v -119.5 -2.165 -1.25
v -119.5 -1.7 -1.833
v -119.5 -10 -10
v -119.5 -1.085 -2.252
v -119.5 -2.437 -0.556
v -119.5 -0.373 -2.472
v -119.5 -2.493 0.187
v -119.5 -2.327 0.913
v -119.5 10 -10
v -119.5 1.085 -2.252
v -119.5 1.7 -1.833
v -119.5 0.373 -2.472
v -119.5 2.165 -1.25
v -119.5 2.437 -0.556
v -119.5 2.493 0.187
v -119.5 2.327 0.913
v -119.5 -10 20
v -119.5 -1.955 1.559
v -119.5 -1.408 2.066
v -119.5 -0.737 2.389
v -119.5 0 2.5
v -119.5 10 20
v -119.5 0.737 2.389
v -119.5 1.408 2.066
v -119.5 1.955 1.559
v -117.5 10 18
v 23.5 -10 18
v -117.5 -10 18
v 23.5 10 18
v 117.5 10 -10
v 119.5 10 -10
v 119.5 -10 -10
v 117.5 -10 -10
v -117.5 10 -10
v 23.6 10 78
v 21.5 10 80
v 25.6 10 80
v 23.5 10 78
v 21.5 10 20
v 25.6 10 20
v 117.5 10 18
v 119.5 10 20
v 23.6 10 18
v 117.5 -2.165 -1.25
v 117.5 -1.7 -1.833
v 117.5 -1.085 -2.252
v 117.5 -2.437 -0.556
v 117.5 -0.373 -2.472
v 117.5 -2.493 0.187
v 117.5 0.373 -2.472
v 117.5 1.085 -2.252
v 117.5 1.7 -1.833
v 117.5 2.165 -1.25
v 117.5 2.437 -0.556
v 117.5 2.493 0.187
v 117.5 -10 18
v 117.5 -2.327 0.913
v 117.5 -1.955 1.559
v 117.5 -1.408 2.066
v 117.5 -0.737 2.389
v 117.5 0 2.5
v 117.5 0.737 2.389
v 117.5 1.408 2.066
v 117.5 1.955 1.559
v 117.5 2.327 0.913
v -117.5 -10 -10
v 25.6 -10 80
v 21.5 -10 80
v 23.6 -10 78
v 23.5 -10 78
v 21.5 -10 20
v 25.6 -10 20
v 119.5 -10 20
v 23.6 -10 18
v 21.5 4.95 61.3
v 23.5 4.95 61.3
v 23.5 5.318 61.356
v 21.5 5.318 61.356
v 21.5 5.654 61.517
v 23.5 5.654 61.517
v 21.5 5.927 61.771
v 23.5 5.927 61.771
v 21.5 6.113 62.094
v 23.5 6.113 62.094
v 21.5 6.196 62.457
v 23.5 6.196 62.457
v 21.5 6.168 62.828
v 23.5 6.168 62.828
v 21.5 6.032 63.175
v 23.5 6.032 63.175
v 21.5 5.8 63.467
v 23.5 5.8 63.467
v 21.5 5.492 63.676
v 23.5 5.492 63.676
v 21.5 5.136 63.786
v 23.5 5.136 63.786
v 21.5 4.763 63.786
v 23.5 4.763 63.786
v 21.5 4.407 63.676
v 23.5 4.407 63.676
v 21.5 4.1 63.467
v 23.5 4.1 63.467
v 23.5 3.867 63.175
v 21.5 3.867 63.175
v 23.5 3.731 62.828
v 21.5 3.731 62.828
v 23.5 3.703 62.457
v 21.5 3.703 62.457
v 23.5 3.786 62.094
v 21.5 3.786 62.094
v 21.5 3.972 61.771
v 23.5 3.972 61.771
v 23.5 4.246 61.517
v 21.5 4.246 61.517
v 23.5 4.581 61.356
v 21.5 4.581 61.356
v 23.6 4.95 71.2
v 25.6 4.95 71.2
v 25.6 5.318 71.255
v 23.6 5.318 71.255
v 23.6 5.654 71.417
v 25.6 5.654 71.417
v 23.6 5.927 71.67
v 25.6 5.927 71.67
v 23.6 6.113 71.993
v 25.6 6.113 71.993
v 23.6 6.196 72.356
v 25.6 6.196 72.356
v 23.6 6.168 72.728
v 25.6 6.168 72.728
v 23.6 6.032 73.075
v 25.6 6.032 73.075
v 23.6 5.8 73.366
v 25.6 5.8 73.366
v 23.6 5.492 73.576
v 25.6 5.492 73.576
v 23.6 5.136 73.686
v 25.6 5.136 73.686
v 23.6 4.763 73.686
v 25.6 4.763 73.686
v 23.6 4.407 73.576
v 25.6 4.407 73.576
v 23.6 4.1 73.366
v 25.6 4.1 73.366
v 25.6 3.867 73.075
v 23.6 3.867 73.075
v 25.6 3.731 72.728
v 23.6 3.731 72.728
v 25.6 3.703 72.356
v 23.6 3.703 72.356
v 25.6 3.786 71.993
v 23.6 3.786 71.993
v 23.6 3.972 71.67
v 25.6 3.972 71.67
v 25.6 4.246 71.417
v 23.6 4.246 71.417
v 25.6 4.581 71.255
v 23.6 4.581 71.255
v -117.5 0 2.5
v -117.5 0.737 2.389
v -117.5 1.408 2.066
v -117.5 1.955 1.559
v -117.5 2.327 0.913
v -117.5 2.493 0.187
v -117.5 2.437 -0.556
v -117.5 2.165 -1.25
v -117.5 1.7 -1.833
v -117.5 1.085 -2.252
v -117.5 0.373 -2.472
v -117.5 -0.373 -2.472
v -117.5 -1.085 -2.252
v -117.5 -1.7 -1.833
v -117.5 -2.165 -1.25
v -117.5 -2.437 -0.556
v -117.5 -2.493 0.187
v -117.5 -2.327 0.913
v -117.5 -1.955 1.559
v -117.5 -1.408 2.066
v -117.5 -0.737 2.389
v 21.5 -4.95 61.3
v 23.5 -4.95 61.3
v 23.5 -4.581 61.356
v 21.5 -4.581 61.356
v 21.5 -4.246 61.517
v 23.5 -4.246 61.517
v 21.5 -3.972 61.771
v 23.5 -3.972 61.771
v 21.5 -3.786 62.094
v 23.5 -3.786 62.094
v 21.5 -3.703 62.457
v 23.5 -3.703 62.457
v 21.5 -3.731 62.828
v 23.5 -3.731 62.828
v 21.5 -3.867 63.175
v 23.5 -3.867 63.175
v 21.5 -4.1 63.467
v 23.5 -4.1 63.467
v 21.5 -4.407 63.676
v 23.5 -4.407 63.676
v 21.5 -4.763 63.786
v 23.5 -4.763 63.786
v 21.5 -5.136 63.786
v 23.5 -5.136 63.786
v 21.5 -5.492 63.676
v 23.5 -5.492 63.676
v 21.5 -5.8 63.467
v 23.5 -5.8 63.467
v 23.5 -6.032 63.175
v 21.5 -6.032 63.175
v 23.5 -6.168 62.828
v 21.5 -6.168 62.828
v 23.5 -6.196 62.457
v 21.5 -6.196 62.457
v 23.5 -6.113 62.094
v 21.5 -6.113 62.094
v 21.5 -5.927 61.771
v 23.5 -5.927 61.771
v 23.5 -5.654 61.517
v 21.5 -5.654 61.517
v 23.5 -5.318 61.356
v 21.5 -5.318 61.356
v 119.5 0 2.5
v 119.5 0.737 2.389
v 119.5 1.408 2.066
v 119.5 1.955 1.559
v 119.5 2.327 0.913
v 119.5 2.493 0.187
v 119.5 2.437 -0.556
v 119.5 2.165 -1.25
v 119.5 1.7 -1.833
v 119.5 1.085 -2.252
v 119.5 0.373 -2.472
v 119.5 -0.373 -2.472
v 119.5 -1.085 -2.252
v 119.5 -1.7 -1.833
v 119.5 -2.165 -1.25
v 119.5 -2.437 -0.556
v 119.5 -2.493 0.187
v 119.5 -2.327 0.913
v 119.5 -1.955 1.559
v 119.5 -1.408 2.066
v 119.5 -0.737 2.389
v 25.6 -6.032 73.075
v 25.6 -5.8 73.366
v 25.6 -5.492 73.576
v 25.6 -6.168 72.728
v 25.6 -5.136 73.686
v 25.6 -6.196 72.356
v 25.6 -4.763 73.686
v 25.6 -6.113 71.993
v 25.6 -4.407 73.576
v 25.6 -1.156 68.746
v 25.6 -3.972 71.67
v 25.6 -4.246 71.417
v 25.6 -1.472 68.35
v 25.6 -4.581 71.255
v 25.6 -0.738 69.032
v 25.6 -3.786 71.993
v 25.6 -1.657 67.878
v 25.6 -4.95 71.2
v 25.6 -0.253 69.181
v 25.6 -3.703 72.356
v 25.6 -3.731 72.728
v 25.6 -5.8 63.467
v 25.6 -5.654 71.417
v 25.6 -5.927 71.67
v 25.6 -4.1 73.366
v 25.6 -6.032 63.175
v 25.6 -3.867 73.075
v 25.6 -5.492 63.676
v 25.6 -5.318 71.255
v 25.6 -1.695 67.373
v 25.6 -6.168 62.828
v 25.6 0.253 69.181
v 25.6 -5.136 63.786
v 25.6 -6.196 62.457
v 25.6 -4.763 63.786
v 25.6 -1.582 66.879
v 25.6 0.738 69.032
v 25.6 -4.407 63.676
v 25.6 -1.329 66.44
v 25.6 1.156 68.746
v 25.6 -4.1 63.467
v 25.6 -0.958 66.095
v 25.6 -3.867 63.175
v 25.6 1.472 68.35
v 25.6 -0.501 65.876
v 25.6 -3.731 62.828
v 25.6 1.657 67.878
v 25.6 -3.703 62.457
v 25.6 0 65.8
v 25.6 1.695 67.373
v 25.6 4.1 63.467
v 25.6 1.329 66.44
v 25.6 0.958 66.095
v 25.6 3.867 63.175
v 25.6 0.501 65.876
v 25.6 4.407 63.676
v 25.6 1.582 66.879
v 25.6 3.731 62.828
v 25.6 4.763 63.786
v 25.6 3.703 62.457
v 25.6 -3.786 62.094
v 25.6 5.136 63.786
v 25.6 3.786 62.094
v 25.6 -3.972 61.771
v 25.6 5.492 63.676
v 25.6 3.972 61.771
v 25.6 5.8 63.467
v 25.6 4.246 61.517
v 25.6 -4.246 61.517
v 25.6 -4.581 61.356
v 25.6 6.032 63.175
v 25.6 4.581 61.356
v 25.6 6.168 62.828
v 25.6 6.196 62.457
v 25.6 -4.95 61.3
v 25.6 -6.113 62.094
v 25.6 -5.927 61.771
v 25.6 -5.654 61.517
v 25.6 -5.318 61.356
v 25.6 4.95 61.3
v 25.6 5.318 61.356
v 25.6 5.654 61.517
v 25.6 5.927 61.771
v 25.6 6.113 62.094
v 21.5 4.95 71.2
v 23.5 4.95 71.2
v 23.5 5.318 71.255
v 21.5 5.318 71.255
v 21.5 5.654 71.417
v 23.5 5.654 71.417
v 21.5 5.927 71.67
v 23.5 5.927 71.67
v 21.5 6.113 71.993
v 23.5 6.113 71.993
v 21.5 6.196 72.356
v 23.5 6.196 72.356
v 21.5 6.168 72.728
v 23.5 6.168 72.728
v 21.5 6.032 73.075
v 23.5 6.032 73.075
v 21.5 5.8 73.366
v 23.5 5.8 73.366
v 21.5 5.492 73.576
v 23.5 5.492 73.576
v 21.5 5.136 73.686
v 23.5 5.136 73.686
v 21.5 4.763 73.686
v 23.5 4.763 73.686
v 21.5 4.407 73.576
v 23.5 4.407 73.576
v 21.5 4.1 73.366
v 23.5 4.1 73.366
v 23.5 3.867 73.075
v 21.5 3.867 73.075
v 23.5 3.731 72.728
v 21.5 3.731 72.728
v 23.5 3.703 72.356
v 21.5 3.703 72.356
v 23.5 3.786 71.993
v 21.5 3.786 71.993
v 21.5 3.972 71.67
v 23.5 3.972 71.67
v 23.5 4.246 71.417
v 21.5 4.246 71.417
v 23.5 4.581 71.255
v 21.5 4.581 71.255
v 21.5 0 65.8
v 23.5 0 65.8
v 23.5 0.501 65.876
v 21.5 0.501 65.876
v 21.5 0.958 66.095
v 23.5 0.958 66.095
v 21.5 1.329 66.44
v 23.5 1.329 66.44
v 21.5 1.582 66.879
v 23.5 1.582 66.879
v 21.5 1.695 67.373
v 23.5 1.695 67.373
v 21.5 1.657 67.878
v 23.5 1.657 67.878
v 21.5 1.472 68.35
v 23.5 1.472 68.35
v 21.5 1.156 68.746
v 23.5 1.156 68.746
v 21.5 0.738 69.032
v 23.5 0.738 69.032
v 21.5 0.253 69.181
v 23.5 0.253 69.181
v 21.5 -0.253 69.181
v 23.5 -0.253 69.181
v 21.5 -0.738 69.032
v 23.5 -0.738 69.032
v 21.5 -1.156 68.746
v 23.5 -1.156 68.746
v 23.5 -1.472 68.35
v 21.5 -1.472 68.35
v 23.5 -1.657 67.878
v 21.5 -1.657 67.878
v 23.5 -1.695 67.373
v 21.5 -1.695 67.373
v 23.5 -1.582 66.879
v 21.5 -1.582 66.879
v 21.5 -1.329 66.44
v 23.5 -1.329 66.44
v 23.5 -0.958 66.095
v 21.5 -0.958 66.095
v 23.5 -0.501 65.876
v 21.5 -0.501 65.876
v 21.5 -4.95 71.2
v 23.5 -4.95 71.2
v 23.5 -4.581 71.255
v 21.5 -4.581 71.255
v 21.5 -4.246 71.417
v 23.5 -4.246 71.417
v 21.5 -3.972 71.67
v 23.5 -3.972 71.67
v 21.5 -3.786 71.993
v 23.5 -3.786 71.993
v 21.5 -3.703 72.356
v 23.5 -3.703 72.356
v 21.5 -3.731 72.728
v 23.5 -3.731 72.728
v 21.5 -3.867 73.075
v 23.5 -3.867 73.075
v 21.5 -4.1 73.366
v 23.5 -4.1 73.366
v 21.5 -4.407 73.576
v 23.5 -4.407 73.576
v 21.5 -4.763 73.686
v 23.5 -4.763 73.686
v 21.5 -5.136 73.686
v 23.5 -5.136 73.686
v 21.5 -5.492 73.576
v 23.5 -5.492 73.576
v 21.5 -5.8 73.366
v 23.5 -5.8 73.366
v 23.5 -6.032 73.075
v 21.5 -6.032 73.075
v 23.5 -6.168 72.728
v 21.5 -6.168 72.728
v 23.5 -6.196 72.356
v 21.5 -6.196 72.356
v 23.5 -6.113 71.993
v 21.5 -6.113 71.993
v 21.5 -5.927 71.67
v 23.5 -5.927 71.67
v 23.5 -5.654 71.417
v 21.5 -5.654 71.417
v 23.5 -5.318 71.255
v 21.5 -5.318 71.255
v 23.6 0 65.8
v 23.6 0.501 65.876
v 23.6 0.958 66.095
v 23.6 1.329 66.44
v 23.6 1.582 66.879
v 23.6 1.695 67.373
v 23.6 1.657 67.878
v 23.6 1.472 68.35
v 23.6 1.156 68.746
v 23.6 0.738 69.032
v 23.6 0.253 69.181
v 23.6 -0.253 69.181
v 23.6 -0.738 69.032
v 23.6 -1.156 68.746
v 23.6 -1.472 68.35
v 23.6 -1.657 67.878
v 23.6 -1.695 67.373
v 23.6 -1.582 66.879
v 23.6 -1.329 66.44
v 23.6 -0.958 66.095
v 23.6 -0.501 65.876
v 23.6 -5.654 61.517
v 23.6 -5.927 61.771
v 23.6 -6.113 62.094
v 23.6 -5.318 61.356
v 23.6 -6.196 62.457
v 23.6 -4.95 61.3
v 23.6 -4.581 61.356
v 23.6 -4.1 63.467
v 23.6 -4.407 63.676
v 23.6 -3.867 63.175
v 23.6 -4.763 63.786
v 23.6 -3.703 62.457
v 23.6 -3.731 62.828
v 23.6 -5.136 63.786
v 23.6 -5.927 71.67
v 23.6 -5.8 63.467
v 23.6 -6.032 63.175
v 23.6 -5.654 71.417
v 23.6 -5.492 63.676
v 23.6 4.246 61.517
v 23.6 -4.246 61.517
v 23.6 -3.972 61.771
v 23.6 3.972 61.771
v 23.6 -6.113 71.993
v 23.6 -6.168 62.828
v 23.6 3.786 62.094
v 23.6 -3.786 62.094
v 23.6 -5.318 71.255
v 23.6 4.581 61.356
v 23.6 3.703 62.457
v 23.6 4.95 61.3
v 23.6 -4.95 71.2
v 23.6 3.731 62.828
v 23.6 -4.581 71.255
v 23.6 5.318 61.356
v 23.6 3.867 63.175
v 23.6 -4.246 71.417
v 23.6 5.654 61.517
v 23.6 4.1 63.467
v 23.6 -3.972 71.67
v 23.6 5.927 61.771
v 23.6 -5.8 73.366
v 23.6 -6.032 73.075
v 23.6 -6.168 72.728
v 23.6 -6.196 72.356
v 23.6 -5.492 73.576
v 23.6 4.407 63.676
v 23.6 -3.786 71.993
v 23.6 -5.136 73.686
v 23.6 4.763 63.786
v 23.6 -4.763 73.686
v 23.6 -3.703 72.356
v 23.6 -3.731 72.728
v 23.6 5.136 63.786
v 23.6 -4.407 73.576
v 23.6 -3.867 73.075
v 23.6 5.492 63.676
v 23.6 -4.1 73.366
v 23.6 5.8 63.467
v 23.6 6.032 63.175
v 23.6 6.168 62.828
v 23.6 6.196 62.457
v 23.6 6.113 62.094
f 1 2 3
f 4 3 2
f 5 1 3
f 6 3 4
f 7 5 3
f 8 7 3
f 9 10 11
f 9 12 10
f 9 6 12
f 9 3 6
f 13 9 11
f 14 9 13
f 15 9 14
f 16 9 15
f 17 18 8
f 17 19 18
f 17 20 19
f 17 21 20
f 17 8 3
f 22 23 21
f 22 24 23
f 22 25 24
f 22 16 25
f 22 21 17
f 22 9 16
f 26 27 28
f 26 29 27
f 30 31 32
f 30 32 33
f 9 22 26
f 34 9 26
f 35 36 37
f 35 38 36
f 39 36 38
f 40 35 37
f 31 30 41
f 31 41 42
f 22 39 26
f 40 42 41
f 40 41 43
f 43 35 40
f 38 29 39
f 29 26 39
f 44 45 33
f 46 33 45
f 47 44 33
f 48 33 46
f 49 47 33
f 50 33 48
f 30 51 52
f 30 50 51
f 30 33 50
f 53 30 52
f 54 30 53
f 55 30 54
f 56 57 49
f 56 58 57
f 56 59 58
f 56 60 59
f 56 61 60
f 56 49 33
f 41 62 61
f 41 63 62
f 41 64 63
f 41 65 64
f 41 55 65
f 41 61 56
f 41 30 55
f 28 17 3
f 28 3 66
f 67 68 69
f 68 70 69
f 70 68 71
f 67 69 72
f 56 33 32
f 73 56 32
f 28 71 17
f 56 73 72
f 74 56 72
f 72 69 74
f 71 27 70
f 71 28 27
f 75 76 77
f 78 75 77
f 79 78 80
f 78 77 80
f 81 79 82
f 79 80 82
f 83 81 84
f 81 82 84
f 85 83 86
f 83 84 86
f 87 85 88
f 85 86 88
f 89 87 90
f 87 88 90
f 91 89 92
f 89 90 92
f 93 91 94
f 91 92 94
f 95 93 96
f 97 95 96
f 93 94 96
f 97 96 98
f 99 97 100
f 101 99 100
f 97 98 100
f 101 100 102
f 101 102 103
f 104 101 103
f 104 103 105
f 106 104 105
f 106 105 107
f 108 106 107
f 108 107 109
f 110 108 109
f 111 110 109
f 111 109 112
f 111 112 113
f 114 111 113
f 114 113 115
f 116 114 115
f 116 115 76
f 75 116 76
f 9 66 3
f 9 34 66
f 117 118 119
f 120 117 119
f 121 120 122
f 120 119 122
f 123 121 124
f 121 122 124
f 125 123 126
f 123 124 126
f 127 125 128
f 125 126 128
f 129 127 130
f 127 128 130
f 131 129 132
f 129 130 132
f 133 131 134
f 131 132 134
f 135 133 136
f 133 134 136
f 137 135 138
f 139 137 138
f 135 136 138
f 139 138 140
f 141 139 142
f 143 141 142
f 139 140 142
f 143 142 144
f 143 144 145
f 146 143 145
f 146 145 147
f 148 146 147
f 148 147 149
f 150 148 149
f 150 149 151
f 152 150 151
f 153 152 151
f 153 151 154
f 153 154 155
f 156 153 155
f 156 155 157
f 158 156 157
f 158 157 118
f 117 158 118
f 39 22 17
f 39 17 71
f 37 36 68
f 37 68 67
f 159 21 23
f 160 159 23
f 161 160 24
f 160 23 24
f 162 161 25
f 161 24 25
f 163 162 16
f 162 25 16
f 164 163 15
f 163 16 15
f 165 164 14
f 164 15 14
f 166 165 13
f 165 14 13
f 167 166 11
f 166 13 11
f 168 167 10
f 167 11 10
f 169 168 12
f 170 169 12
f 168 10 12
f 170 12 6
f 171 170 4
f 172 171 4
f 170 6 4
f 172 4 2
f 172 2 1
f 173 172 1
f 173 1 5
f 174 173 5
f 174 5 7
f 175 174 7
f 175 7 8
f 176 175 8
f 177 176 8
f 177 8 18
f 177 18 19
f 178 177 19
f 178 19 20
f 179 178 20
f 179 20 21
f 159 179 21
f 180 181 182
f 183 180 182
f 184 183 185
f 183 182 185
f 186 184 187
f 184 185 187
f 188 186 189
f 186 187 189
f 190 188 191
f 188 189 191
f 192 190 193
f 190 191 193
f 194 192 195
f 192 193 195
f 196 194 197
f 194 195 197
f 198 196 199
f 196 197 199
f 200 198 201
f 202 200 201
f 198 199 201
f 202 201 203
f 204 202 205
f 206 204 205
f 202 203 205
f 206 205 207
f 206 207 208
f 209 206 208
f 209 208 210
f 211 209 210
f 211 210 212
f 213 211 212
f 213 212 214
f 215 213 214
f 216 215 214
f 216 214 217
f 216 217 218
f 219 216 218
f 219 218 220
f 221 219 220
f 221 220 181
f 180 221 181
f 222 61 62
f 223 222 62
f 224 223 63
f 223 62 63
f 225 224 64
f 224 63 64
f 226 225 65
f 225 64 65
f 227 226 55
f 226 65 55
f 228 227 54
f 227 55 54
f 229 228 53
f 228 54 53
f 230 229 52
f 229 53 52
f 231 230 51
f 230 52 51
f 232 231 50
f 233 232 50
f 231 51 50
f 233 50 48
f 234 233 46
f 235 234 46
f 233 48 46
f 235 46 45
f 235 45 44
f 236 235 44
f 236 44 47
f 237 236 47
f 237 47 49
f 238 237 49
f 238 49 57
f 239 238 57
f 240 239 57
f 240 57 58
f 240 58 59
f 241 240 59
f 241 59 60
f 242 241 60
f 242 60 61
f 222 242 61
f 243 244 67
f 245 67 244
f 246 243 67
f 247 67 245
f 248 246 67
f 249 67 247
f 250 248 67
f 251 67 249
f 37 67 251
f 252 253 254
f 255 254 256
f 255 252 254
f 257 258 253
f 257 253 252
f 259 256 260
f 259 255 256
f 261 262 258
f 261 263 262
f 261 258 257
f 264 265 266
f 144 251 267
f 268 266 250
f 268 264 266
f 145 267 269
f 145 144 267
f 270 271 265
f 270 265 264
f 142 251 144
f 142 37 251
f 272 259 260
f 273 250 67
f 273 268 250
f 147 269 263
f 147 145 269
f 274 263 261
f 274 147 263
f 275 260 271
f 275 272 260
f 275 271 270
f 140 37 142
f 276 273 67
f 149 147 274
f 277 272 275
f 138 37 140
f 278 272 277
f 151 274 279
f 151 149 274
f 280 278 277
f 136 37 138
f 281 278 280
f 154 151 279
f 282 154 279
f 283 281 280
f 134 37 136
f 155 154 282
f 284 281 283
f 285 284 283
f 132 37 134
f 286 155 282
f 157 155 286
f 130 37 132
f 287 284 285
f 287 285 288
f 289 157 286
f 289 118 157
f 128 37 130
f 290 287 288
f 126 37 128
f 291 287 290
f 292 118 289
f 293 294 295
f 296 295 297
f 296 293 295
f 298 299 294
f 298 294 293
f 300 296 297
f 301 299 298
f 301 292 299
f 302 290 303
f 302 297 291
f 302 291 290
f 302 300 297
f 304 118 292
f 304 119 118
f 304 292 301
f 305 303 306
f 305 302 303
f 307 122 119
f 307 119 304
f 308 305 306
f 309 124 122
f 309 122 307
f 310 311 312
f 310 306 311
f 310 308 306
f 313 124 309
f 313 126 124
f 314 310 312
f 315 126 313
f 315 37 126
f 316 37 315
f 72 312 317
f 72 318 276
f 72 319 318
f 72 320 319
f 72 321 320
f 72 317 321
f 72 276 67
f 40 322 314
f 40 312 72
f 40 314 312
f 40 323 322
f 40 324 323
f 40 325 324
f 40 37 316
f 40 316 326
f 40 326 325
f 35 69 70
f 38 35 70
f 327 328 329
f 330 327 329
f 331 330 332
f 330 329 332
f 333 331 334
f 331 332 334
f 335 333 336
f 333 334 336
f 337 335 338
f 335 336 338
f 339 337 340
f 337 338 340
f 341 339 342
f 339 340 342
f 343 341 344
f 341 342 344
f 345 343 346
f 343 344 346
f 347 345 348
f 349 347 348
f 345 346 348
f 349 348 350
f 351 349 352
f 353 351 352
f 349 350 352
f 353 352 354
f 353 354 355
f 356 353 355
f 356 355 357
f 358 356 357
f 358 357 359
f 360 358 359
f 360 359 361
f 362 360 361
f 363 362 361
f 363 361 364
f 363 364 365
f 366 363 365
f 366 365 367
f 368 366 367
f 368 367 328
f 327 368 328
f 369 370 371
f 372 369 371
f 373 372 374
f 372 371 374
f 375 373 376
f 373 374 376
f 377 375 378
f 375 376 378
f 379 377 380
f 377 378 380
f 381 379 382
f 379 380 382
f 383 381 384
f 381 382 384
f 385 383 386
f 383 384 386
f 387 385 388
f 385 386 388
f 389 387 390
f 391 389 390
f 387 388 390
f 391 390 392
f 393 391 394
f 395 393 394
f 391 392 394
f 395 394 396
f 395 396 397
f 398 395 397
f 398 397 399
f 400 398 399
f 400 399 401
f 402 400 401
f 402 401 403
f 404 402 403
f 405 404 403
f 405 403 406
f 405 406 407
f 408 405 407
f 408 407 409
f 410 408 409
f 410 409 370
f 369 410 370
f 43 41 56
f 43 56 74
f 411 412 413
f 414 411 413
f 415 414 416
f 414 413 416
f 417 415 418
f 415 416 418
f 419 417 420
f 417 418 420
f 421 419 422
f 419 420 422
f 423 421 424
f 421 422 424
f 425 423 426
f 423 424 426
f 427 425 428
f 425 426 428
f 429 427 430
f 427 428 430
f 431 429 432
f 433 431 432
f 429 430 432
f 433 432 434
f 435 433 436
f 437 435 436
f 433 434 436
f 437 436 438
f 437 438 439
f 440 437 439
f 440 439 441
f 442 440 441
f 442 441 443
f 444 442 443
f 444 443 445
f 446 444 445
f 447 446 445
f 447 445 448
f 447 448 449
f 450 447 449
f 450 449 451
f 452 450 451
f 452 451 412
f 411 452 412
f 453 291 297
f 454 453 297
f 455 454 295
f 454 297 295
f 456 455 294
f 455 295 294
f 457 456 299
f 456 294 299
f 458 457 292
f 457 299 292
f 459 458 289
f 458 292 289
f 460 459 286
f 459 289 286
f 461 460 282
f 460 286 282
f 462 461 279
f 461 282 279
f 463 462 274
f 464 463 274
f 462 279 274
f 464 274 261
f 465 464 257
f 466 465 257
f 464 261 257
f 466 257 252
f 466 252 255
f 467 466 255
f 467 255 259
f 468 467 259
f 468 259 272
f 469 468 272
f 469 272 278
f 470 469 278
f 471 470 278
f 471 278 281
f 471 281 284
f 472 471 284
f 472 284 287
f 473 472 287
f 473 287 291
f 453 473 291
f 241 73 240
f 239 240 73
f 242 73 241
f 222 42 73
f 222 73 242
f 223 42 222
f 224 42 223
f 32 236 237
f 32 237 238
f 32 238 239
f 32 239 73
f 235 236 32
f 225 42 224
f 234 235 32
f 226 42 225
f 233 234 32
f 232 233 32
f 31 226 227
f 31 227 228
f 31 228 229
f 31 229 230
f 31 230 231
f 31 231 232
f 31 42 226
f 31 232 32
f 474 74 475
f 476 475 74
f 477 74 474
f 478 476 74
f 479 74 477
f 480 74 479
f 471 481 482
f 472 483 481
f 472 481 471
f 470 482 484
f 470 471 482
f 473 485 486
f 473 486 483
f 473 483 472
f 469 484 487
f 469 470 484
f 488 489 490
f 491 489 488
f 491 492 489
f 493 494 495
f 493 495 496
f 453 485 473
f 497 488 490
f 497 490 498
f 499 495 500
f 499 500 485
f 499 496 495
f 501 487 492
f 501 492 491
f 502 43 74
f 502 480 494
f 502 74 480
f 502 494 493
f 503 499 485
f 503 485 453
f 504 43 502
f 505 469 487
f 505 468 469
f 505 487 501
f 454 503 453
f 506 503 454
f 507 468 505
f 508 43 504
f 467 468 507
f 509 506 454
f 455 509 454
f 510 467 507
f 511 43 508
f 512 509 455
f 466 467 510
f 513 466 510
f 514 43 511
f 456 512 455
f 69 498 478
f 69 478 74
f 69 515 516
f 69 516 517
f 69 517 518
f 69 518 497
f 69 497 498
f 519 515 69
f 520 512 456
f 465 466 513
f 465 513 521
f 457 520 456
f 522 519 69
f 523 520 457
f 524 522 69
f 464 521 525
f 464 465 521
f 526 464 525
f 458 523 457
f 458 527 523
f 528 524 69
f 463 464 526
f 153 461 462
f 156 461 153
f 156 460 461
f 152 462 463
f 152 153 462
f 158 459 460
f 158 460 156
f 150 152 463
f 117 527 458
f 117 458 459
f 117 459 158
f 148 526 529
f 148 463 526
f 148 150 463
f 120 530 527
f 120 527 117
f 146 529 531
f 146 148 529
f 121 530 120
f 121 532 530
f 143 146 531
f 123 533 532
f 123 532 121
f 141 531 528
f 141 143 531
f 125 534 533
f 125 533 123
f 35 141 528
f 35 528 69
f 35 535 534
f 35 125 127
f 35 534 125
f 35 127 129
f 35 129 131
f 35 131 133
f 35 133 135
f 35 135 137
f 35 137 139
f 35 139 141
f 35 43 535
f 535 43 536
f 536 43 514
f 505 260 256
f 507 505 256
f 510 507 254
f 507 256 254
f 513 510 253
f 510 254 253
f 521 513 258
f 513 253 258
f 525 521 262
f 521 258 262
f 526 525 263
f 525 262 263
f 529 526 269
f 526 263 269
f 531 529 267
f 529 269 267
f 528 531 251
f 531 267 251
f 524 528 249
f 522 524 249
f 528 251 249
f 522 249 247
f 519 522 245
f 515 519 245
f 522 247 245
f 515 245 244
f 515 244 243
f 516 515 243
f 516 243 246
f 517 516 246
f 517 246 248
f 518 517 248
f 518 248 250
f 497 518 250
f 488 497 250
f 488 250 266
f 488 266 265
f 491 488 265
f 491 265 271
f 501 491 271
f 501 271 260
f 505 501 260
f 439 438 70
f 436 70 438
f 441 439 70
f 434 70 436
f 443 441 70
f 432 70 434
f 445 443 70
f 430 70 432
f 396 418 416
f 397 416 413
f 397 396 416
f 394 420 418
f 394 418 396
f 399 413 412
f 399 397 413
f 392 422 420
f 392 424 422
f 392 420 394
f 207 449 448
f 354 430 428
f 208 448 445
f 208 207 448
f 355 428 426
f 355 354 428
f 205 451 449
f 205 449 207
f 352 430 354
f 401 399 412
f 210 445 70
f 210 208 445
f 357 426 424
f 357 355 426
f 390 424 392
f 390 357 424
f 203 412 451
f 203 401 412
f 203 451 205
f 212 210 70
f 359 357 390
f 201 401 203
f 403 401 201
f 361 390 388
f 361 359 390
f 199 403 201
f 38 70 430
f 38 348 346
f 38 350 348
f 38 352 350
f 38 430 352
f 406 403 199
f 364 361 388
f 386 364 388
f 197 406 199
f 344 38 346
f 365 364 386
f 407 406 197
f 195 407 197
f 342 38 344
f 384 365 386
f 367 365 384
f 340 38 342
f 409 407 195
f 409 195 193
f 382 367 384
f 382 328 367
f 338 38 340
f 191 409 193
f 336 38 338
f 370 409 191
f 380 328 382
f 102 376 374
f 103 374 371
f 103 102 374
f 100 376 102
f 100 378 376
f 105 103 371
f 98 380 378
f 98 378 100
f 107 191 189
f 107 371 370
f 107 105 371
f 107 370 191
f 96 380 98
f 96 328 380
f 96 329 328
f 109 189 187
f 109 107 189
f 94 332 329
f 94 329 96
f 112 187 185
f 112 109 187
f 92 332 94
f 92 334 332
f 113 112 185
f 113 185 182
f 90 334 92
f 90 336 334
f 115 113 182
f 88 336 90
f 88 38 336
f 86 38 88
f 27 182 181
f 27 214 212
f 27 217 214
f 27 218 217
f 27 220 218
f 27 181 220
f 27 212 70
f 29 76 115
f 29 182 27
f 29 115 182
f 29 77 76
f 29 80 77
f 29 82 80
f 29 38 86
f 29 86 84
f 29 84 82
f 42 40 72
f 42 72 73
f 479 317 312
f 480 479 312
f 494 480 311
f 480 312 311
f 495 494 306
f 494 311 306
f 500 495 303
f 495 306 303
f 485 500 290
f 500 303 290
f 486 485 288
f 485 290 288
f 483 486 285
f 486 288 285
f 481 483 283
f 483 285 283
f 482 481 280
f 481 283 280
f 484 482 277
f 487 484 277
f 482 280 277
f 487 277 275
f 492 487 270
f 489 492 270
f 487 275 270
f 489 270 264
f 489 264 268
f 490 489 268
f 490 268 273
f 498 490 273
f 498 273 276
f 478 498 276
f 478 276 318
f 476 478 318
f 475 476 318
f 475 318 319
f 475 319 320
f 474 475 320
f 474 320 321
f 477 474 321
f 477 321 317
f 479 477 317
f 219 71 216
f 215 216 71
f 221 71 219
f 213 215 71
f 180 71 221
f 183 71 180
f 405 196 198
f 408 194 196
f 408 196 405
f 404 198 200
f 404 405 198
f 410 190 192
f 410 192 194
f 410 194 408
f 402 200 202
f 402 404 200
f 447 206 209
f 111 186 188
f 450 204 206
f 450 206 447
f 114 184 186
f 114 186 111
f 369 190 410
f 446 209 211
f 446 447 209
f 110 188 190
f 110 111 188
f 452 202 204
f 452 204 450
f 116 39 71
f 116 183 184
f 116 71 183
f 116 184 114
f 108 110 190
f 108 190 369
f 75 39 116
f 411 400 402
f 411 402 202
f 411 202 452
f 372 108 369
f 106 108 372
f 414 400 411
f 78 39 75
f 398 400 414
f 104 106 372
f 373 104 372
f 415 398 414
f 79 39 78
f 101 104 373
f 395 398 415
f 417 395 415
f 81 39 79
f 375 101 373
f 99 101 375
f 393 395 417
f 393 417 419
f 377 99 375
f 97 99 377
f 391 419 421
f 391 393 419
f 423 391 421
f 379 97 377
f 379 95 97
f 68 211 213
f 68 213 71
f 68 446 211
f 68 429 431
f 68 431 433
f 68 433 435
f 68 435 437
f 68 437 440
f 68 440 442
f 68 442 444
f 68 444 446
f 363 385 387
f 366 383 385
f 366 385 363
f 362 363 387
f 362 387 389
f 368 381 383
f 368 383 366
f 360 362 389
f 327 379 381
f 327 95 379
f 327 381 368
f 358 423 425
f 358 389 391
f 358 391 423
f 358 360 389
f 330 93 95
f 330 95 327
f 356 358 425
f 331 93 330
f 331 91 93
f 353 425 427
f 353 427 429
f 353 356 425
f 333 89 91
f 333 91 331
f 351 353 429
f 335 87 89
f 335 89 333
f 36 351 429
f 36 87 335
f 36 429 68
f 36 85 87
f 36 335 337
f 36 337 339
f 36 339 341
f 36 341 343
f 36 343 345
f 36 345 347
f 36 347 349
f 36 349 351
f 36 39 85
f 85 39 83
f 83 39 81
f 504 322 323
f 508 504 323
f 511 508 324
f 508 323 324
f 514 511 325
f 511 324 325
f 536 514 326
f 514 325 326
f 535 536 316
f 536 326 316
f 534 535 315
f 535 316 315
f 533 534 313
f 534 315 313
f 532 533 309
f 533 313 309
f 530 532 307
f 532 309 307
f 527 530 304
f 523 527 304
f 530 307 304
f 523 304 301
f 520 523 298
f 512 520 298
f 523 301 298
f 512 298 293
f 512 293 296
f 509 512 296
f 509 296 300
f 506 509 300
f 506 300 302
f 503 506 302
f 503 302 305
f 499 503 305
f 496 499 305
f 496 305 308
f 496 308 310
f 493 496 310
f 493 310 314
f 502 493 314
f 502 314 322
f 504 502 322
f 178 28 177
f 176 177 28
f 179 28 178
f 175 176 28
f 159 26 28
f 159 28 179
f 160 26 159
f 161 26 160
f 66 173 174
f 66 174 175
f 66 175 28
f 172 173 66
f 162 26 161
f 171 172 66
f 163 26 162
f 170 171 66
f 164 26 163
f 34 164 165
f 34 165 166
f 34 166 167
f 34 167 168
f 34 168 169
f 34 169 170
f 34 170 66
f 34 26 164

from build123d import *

# Parameters (mm, degrees)
BOSS_EXTRUDE1_DEPTH      = 10
BOSS_EXTRUDE1_DEPTH_BACK = 10
SKETCH2_R                = 2.5
CUT_EXTRUDE1_DEPTH       = 285
SKETCH3_R                = 1.7
SKETCH3_R_2              = 1.25
CUT_EXTRUDE2_DEPTH       = 285


with BuildPart() as part:
    # Sketch1 → Boss-Extrude1 (new, two sides: drawn at the far end of the back side and taken through both)
    with BuildSketch(Plane(origin=(0, 0, 0), x_dir=(1, 0, 0), z_dir=(0, 1, 0)).offset(-BOSS_EXTRUDE1_DEPTH_BACK)):
        Polygon((25.6, -20), (119.5, -20), (119.5, 10), (117.5, 10), (117.5, -18), (23.6, -18), (23.6, -78), (23.5, -78), (23.5, -18), (-117.5, -18), (-117.5, 10), (-119.5, 10), (-119.5, -20), (21.5, -20), (21.5, -80), (25.6, -80), align=None)
    extrude(amount=BOSS_EXTRUDE1_DEPTH + BOSS_EXTRUDE1_DEPTH_BACK)

    # Sketch2 → Cut-Extrude1 (cut)
    with BuildSketch(Plane.ZY.offset(119.5)):
        Circle(SKETCH2_R)
    extrude(amount=-CUT_EXTRUDE1_DEPTH, mode=Mode.SUBTRACT)

    # Sketch3 → Cut-Extrude2 (cut)
    with BuildSketch(Plane(origin=(25.6, 0, 0), x_dir=(0, 0, -1), z_dir=(1, 0, 0))):
        with Locations((-67.5, 0)):
            Circle(SKETCH3_R)
        with Locations((-72.449747468, -4.949747468)):
            Circle(SKETCH3_R_2)
        with Locations((-72.449747468, 4.949747468)):
            Circle(SKETCH3_R_2)
        with Locations((-62.550252532, 4.949747468)):
            Circle(SKETCH3_R_2)
        with Locations((-62.550252532, -4.949747468)):
            Circle(SKETCH3_R_2)
    extrude(amount=-CUT_EXTRUDE2_DEPTH, mode=Mode.SUBTRACT)


solid = part.part
